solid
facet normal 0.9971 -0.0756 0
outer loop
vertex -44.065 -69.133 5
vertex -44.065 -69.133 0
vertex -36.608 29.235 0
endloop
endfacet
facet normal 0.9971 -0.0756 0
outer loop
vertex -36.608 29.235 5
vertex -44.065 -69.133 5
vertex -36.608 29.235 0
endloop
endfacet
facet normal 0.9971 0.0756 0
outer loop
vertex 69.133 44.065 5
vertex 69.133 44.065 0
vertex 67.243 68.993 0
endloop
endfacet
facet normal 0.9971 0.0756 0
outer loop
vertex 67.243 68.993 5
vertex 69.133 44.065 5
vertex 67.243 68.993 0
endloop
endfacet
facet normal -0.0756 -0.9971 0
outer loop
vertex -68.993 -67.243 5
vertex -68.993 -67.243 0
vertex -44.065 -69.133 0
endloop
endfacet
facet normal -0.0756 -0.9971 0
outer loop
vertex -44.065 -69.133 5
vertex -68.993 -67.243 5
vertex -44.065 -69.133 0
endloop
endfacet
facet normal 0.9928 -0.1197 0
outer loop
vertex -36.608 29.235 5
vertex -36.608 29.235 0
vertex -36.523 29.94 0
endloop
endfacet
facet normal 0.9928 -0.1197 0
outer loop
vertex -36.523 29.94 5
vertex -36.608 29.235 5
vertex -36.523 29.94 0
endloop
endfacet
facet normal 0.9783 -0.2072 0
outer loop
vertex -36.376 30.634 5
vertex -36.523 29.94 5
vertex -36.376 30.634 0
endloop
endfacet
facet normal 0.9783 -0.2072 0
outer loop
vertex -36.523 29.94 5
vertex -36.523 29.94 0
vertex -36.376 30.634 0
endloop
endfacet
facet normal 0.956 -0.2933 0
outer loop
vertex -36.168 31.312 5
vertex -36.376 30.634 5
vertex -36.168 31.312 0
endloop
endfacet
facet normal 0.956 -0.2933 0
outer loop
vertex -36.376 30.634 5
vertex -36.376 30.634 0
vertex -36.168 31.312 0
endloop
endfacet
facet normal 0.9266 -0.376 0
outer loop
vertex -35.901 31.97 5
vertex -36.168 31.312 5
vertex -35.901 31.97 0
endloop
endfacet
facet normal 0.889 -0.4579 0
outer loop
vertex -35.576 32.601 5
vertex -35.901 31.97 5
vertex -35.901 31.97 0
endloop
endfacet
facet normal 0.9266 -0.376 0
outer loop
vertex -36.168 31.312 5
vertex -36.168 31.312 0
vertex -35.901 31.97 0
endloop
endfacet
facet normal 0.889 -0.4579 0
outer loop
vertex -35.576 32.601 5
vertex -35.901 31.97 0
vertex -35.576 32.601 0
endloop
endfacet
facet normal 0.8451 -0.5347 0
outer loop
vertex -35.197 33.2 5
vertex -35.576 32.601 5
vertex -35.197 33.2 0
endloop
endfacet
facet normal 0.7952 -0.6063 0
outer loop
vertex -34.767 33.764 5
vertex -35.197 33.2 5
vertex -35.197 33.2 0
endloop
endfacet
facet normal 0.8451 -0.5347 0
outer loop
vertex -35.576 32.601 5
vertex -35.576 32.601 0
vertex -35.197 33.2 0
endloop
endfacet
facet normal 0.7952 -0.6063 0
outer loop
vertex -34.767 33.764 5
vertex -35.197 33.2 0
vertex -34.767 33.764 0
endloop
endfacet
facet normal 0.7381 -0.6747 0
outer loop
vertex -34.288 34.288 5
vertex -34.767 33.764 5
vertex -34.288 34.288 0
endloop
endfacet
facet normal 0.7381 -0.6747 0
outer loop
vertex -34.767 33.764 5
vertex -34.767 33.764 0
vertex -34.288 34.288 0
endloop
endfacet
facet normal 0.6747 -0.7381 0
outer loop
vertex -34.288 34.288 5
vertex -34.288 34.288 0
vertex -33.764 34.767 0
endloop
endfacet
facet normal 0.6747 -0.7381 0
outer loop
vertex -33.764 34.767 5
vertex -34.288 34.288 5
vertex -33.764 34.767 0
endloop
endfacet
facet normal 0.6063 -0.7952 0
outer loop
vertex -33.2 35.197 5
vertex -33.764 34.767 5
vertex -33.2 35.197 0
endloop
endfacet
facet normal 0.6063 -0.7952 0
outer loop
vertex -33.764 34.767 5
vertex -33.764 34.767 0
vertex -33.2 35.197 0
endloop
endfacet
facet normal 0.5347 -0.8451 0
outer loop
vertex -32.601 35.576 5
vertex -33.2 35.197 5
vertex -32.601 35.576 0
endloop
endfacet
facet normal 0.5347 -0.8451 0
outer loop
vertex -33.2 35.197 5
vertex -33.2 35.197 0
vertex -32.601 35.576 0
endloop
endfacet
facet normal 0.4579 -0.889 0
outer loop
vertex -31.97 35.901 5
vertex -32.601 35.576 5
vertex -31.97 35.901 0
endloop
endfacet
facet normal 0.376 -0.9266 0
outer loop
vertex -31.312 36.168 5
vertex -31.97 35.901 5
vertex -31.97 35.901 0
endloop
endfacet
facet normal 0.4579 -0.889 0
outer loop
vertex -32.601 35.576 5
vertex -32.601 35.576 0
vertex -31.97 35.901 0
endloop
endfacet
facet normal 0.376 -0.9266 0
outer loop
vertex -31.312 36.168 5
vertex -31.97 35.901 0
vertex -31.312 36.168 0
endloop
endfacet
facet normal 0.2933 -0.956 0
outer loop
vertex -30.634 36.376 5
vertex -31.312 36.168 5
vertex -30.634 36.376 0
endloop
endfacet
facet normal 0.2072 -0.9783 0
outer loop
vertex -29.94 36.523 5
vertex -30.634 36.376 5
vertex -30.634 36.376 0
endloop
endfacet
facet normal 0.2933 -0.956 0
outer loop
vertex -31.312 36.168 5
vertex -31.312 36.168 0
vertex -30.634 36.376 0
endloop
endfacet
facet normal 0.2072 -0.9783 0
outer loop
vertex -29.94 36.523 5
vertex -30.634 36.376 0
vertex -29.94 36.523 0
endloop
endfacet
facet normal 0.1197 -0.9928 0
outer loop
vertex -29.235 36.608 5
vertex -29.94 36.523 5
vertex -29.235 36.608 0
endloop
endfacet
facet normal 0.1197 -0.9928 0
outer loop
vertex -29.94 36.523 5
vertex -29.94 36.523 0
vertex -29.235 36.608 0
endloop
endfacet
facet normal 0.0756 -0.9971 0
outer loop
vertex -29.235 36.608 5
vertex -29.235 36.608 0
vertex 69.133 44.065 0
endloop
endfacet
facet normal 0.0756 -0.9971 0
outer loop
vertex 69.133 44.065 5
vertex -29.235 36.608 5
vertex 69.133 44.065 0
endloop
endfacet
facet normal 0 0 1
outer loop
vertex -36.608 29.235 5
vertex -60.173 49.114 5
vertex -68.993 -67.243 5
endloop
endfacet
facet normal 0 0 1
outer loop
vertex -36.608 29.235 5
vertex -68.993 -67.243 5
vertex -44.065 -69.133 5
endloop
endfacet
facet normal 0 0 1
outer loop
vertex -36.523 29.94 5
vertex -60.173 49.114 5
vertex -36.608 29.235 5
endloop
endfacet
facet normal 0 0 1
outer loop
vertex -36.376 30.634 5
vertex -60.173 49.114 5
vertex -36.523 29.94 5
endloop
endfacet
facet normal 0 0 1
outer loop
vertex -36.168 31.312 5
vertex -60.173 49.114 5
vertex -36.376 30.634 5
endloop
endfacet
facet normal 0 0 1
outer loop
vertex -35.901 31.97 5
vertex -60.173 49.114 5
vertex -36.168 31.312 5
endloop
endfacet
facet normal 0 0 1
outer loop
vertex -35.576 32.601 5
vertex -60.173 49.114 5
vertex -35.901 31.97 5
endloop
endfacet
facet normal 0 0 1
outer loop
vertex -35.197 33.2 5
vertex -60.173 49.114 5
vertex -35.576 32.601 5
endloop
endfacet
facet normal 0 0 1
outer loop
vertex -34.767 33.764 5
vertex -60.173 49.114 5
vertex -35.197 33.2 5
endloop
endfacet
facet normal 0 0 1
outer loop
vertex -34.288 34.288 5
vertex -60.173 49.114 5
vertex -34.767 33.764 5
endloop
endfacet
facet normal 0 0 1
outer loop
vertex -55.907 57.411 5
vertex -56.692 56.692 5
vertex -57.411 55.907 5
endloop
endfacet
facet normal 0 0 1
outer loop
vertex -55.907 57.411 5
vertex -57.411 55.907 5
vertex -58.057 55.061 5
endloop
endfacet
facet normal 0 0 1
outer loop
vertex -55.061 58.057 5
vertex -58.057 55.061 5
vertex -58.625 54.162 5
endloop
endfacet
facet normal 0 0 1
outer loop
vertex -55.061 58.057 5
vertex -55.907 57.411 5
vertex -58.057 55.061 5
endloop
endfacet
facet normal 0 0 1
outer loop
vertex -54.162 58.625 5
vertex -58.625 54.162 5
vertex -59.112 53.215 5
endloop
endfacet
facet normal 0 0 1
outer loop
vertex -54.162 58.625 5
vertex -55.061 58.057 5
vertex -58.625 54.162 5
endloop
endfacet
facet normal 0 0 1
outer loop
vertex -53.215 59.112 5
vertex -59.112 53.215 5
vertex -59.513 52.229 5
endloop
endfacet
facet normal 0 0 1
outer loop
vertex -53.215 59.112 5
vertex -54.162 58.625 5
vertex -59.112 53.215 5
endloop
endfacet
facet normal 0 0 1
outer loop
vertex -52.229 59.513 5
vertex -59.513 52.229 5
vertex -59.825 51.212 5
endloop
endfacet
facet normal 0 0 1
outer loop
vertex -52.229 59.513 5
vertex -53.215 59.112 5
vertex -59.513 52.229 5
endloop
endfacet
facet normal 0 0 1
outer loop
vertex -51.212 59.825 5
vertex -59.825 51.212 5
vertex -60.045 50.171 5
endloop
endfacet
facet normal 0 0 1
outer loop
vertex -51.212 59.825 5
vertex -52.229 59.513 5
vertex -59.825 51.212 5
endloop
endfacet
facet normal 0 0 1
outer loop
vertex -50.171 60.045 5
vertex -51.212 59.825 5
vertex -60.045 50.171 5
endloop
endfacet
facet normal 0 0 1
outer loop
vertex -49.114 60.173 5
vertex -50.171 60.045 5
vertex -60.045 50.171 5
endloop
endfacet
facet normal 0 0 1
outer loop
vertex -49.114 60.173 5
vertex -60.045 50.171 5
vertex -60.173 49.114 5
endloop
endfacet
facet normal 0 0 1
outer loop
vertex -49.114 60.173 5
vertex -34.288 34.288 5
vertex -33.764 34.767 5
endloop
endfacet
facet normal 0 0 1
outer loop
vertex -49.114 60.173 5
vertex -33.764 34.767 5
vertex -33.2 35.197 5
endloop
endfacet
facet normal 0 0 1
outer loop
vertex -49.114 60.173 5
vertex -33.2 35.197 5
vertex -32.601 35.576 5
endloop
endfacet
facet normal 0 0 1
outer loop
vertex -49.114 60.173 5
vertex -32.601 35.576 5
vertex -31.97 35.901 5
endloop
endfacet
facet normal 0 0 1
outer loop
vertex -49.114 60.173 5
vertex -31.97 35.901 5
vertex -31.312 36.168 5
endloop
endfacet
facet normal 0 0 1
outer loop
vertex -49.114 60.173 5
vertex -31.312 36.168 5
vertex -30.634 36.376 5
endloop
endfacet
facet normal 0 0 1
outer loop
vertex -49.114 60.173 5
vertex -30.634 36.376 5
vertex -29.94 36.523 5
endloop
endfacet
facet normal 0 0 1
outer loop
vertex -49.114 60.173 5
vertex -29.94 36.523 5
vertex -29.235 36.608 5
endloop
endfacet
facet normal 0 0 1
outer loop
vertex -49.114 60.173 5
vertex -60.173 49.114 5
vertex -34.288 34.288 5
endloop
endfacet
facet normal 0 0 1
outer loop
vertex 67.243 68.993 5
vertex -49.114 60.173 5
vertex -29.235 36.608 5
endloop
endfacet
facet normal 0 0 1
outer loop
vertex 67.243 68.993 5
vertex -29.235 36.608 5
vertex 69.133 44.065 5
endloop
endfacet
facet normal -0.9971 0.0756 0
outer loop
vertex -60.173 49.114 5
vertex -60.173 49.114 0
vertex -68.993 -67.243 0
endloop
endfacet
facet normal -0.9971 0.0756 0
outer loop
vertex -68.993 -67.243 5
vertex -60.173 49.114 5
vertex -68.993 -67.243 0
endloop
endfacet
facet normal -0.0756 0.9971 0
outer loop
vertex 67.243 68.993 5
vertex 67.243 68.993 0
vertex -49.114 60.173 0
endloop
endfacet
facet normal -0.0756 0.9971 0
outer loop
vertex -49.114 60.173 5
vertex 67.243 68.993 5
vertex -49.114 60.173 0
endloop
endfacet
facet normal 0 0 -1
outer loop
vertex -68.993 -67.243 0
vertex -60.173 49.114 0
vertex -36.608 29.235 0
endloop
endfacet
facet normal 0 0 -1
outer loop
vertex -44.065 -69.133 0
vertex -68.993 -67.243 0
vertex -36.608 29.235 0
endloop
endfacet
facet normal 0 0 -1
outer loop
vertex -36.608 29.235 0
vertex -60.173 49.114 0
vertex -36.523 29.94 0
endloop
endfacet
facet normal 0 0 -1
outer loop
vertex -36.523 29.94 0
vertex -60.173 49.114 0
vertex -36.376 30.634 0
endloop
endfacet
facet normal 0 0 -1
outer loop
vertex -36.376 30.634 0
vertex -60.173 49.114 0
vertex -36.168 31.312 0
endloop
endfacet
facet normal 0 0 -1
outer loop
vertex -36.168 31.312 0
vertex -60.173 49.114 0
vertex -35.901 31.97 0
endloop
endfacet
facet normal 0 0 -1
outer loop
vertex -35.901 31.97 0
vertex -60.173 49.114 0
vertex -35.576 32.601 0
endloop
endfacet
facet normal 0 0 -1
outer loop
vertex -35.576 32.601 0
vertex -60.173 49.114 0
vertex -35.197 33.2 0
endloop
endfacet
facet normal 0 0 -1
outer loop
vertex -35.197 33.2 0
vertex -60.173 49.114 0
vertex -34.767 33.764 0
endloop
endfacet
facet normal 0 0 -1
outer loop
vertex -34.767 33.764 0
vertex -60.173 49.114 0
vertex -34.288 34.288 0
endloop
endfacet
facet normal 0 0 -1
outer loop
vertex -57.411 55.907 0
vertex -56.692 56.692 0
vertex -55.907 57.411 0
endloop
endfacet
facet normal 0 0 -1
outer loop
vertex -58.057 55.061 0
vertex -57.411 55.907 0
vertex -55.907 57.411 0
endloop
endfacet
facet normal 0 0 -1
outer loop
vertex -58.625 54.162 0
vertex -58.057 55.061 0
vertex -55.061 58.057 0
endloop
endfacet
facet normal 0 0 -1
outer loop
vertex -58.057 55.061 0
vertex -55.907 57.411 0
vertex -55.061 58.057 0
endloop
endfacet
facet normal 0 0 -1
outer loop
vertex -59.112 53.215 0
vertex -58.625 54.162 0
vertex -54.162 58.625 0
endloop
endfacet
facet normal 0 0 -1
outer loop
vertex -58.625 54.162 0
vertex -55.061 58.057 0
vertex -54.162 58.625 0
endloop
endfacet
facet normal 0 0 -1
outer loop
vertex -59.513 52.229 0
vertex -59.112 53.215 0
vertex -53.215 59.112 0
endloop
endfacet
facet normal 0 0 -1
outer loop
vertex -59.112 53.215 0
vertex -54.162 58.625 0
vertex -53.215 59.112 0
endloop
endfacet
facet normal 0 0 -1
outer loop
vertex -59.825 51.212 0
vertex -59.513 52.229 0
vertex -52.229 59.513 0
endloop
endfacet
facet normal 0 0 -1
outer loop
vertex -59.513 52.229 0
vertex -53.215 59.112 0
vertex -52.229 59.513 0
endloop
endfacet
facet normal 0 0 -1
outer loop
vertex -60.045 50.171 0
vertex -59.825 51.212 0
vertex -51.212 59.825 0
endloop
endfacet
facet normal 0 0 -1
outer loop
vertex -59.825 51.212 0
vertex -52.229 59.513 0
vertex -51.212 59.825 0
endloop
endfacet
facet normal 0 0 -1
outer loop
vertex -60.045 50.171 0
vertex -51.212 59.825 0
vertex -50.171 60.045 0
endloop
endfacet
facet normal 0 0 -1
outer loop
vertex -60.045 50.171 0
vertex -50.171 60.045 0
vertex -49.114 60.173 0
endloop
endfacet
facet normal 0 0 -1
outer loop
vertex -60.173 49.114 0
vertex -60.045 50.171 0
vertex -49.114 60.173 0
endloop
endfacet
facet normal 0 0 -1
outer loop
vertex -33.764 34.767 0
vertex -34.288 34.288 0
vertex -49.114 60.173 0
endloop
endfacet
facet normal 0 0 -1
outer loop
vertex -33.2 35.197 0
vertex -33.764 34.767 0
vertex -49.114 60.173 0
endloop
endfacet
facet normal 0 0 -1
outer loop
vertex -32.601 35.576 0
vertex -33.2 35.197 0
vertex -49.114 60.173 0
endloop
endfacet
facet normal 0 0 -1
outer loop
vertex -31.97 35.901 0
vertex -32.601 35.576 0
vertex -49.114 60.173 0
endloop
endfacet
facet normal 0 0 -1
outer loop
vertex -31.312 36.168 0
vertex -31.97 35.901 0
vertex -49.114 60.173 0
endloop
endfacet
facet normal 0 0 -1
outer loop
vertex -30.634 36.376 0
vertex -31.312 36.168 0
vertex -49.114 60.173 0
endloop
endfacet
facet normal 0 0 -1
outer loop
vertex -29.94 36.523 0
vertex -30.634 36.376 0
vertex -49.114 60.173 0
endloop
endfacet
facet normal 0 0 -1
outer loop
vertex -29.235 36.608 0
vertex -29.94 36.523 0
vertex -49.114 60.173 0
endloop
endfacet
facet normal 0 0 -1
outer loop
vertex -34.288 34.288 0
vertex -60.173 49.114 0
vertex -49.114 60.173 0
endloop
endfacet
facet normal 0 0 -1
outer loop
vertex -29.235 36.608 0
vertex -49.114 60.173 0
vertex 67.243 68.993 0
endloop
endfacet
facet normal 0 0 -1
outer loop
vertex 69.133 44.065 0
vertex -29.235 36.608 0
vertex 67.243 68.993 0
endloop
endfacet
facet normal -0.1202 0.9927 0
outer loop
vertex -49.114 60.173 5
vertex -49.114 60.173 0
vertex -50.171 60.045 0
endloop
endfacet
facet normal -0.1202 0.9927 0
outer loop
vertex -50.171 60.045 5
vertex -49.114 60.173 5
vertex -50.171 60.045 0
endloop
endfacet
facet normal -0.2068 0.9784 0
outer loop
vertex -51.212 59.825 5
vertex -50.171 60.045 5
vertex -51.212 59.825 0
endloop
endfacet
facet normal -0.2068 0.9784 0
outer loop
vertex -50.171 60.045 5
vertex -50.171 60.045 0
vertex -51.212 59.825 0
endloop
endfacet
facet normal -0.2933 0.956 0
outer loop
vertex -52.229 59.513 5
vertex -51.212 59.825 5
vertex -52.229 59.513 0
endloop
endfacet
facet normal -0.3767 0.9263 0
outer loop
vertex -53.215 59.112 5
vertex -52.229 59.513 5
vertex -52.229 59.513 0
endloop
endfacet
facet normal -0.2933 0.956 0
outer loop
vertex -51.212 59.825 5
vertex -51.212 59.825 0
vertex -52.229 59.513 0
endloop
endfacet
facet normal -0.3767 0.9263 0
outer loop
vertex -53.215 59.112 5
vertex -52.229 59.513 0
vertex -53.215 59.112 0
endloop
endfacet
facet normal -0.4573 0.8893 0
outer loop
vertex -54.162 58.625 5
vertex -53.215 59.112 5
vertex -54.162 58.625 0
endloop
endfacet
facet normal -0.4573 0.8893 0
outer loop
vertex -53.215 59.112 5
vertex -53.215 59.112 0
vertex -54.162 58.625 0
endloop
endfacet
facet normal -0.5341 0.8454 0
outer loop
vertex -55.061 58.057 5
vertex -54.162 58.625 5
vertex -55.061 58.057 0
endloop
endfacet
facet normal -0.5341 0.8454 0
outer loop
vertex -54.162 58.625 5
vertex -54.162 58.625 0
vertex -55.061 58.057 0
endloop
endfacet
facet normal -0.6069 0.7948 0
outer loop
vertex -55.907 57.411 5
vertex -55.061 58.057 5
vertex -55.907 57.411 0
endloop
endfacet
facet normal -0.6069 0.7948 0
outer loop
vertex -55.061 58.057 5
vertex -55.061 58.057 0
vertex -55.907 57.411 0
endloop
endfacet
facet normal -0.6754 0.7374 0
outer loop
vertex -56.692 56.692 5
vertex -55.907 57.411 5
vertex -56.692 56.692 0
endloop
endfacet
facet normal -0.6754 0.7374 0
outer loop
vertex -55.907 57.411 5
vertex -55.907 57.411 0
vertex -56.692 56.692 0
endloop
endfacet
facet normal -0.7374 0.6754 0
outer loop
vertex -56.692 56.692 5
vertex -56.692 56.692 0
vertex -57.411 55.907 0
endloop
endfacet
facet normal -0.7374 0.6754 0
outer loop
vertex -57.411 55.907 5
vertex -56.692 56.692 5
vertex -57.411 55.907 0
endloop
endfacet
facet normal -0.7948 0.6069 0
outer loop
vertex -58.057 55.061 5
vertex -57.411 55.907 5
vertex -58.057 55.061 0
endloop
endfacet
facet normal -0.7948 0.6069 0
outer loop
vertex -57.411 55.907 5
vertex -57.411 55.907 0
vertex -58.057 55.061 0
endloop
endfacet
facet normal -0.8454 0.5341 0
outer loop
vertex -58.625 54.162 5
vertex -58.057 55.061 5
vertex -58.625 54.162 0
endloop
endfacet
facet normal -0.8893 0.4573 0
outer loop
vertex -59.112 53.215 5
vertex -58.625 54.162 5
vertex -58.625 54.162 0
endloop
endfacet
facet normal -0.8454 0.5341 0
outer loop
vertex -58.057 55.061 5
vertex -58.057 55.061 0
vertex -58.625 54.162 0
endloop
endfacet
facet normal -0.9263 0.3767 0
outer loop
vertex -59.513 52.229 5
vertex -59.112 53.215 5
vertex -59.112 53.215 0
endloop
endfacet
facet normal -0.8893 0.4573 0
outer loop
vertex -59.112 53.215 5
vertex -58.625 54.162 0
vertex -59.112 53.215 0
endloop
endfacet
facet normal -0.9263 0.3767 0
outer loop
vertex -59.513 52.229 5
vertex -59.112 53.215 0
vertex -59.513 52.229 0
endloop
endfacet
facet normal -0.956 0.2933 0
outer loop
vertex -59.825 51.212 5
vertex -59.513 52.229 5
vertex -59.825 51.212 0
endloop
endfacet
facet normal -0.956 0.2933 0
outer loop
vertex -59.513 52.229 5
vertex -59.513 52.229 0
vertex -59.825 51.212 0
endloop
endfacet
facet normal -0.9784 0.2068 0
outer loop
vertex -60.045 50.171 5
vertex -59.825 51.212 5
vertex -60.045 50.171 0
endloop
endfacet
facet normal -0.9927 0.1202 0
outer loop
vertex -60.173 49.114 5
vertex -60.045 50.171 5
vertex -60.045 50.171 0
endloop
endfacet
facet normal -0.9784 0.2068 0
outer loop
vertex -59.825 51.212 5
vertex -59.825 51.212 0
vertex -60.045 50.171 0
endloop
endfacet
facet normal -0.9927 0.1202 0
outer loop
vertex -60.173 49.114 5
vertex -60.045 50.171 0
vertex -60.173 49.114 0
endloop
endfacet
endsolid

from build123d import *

# Parameters (mm, degrees)
F1_DEPTH = 5
F4_DEPTH = 5


# Not quite as in the source:
# - a feature of the source that left no trace in its solid (it failed there, or was rolled back) is left out


with BuildPart() as f1:
    # F0 (on Top) → F1 (new body)
    with BuildSketch(Plane.XY):
        with BuildLine():
            Line((67.2432569916, 68.9932702117), (-49.1140455478, 60.1726392496))
            ThreePointArc((-49.1140455478, 60.1726392496), (-53.2152003045, 59.1119075124), (-56.692252409, 56.692252409))
            Line((-56.692252409, 56.692252409), (-36.0883415168, 36.0883415168))
            Line((-36.0883415168, 36.0883415168), (-34.2875776013, 34.2875776013))
            ThreePointArc((-34.2875776013, 34.2875776013), (-31.969542865, 35.9006810036), (-29.2354396938, 36.607835495))
            Line((-29.2354396938, 36.607835495), (69.1329955604, 44.0647947641))
            Line((69.1329955604, 44.0647947641), (67.2432569916, 68.9932702117))
        make_face()
    extrude(amount=F1_DEPTH)

    # F0 (on Top) → F4 (join)
    with BuildSketch(Plane.XY):
        with BuildLine():
            Line((-36.0883415168, 36.0883415168), (-56.692252409, 56.692252409))
            ThreePointArc((-56.692252409, 56.692252409), (-59.1119075124, 53.2152003045), (-60.1726392496, 49.1140455478))
            Line((-60.1726392496, 49.1140455478), (-68.9932702117, -67.2432569916))
            Line((-68.9932702117, -67.2432569916), (-44.0647947641, -69.1329955604))
            Line((-44.0647947641, -69.1329955604), (-36.607835495, 29.2354396938))
            ThreePointArc((-36.607835495, 29.2354396938), (-35.9006810036, 31.969542865), (-34.2875776013, 34.2875776013))
            Line((-34.2875776013, 34.2875776013), (-36.0883415168, 36.0883415168))
        make_face()
    extrude(amount=F4_DEPTH)


solid = f1.part
